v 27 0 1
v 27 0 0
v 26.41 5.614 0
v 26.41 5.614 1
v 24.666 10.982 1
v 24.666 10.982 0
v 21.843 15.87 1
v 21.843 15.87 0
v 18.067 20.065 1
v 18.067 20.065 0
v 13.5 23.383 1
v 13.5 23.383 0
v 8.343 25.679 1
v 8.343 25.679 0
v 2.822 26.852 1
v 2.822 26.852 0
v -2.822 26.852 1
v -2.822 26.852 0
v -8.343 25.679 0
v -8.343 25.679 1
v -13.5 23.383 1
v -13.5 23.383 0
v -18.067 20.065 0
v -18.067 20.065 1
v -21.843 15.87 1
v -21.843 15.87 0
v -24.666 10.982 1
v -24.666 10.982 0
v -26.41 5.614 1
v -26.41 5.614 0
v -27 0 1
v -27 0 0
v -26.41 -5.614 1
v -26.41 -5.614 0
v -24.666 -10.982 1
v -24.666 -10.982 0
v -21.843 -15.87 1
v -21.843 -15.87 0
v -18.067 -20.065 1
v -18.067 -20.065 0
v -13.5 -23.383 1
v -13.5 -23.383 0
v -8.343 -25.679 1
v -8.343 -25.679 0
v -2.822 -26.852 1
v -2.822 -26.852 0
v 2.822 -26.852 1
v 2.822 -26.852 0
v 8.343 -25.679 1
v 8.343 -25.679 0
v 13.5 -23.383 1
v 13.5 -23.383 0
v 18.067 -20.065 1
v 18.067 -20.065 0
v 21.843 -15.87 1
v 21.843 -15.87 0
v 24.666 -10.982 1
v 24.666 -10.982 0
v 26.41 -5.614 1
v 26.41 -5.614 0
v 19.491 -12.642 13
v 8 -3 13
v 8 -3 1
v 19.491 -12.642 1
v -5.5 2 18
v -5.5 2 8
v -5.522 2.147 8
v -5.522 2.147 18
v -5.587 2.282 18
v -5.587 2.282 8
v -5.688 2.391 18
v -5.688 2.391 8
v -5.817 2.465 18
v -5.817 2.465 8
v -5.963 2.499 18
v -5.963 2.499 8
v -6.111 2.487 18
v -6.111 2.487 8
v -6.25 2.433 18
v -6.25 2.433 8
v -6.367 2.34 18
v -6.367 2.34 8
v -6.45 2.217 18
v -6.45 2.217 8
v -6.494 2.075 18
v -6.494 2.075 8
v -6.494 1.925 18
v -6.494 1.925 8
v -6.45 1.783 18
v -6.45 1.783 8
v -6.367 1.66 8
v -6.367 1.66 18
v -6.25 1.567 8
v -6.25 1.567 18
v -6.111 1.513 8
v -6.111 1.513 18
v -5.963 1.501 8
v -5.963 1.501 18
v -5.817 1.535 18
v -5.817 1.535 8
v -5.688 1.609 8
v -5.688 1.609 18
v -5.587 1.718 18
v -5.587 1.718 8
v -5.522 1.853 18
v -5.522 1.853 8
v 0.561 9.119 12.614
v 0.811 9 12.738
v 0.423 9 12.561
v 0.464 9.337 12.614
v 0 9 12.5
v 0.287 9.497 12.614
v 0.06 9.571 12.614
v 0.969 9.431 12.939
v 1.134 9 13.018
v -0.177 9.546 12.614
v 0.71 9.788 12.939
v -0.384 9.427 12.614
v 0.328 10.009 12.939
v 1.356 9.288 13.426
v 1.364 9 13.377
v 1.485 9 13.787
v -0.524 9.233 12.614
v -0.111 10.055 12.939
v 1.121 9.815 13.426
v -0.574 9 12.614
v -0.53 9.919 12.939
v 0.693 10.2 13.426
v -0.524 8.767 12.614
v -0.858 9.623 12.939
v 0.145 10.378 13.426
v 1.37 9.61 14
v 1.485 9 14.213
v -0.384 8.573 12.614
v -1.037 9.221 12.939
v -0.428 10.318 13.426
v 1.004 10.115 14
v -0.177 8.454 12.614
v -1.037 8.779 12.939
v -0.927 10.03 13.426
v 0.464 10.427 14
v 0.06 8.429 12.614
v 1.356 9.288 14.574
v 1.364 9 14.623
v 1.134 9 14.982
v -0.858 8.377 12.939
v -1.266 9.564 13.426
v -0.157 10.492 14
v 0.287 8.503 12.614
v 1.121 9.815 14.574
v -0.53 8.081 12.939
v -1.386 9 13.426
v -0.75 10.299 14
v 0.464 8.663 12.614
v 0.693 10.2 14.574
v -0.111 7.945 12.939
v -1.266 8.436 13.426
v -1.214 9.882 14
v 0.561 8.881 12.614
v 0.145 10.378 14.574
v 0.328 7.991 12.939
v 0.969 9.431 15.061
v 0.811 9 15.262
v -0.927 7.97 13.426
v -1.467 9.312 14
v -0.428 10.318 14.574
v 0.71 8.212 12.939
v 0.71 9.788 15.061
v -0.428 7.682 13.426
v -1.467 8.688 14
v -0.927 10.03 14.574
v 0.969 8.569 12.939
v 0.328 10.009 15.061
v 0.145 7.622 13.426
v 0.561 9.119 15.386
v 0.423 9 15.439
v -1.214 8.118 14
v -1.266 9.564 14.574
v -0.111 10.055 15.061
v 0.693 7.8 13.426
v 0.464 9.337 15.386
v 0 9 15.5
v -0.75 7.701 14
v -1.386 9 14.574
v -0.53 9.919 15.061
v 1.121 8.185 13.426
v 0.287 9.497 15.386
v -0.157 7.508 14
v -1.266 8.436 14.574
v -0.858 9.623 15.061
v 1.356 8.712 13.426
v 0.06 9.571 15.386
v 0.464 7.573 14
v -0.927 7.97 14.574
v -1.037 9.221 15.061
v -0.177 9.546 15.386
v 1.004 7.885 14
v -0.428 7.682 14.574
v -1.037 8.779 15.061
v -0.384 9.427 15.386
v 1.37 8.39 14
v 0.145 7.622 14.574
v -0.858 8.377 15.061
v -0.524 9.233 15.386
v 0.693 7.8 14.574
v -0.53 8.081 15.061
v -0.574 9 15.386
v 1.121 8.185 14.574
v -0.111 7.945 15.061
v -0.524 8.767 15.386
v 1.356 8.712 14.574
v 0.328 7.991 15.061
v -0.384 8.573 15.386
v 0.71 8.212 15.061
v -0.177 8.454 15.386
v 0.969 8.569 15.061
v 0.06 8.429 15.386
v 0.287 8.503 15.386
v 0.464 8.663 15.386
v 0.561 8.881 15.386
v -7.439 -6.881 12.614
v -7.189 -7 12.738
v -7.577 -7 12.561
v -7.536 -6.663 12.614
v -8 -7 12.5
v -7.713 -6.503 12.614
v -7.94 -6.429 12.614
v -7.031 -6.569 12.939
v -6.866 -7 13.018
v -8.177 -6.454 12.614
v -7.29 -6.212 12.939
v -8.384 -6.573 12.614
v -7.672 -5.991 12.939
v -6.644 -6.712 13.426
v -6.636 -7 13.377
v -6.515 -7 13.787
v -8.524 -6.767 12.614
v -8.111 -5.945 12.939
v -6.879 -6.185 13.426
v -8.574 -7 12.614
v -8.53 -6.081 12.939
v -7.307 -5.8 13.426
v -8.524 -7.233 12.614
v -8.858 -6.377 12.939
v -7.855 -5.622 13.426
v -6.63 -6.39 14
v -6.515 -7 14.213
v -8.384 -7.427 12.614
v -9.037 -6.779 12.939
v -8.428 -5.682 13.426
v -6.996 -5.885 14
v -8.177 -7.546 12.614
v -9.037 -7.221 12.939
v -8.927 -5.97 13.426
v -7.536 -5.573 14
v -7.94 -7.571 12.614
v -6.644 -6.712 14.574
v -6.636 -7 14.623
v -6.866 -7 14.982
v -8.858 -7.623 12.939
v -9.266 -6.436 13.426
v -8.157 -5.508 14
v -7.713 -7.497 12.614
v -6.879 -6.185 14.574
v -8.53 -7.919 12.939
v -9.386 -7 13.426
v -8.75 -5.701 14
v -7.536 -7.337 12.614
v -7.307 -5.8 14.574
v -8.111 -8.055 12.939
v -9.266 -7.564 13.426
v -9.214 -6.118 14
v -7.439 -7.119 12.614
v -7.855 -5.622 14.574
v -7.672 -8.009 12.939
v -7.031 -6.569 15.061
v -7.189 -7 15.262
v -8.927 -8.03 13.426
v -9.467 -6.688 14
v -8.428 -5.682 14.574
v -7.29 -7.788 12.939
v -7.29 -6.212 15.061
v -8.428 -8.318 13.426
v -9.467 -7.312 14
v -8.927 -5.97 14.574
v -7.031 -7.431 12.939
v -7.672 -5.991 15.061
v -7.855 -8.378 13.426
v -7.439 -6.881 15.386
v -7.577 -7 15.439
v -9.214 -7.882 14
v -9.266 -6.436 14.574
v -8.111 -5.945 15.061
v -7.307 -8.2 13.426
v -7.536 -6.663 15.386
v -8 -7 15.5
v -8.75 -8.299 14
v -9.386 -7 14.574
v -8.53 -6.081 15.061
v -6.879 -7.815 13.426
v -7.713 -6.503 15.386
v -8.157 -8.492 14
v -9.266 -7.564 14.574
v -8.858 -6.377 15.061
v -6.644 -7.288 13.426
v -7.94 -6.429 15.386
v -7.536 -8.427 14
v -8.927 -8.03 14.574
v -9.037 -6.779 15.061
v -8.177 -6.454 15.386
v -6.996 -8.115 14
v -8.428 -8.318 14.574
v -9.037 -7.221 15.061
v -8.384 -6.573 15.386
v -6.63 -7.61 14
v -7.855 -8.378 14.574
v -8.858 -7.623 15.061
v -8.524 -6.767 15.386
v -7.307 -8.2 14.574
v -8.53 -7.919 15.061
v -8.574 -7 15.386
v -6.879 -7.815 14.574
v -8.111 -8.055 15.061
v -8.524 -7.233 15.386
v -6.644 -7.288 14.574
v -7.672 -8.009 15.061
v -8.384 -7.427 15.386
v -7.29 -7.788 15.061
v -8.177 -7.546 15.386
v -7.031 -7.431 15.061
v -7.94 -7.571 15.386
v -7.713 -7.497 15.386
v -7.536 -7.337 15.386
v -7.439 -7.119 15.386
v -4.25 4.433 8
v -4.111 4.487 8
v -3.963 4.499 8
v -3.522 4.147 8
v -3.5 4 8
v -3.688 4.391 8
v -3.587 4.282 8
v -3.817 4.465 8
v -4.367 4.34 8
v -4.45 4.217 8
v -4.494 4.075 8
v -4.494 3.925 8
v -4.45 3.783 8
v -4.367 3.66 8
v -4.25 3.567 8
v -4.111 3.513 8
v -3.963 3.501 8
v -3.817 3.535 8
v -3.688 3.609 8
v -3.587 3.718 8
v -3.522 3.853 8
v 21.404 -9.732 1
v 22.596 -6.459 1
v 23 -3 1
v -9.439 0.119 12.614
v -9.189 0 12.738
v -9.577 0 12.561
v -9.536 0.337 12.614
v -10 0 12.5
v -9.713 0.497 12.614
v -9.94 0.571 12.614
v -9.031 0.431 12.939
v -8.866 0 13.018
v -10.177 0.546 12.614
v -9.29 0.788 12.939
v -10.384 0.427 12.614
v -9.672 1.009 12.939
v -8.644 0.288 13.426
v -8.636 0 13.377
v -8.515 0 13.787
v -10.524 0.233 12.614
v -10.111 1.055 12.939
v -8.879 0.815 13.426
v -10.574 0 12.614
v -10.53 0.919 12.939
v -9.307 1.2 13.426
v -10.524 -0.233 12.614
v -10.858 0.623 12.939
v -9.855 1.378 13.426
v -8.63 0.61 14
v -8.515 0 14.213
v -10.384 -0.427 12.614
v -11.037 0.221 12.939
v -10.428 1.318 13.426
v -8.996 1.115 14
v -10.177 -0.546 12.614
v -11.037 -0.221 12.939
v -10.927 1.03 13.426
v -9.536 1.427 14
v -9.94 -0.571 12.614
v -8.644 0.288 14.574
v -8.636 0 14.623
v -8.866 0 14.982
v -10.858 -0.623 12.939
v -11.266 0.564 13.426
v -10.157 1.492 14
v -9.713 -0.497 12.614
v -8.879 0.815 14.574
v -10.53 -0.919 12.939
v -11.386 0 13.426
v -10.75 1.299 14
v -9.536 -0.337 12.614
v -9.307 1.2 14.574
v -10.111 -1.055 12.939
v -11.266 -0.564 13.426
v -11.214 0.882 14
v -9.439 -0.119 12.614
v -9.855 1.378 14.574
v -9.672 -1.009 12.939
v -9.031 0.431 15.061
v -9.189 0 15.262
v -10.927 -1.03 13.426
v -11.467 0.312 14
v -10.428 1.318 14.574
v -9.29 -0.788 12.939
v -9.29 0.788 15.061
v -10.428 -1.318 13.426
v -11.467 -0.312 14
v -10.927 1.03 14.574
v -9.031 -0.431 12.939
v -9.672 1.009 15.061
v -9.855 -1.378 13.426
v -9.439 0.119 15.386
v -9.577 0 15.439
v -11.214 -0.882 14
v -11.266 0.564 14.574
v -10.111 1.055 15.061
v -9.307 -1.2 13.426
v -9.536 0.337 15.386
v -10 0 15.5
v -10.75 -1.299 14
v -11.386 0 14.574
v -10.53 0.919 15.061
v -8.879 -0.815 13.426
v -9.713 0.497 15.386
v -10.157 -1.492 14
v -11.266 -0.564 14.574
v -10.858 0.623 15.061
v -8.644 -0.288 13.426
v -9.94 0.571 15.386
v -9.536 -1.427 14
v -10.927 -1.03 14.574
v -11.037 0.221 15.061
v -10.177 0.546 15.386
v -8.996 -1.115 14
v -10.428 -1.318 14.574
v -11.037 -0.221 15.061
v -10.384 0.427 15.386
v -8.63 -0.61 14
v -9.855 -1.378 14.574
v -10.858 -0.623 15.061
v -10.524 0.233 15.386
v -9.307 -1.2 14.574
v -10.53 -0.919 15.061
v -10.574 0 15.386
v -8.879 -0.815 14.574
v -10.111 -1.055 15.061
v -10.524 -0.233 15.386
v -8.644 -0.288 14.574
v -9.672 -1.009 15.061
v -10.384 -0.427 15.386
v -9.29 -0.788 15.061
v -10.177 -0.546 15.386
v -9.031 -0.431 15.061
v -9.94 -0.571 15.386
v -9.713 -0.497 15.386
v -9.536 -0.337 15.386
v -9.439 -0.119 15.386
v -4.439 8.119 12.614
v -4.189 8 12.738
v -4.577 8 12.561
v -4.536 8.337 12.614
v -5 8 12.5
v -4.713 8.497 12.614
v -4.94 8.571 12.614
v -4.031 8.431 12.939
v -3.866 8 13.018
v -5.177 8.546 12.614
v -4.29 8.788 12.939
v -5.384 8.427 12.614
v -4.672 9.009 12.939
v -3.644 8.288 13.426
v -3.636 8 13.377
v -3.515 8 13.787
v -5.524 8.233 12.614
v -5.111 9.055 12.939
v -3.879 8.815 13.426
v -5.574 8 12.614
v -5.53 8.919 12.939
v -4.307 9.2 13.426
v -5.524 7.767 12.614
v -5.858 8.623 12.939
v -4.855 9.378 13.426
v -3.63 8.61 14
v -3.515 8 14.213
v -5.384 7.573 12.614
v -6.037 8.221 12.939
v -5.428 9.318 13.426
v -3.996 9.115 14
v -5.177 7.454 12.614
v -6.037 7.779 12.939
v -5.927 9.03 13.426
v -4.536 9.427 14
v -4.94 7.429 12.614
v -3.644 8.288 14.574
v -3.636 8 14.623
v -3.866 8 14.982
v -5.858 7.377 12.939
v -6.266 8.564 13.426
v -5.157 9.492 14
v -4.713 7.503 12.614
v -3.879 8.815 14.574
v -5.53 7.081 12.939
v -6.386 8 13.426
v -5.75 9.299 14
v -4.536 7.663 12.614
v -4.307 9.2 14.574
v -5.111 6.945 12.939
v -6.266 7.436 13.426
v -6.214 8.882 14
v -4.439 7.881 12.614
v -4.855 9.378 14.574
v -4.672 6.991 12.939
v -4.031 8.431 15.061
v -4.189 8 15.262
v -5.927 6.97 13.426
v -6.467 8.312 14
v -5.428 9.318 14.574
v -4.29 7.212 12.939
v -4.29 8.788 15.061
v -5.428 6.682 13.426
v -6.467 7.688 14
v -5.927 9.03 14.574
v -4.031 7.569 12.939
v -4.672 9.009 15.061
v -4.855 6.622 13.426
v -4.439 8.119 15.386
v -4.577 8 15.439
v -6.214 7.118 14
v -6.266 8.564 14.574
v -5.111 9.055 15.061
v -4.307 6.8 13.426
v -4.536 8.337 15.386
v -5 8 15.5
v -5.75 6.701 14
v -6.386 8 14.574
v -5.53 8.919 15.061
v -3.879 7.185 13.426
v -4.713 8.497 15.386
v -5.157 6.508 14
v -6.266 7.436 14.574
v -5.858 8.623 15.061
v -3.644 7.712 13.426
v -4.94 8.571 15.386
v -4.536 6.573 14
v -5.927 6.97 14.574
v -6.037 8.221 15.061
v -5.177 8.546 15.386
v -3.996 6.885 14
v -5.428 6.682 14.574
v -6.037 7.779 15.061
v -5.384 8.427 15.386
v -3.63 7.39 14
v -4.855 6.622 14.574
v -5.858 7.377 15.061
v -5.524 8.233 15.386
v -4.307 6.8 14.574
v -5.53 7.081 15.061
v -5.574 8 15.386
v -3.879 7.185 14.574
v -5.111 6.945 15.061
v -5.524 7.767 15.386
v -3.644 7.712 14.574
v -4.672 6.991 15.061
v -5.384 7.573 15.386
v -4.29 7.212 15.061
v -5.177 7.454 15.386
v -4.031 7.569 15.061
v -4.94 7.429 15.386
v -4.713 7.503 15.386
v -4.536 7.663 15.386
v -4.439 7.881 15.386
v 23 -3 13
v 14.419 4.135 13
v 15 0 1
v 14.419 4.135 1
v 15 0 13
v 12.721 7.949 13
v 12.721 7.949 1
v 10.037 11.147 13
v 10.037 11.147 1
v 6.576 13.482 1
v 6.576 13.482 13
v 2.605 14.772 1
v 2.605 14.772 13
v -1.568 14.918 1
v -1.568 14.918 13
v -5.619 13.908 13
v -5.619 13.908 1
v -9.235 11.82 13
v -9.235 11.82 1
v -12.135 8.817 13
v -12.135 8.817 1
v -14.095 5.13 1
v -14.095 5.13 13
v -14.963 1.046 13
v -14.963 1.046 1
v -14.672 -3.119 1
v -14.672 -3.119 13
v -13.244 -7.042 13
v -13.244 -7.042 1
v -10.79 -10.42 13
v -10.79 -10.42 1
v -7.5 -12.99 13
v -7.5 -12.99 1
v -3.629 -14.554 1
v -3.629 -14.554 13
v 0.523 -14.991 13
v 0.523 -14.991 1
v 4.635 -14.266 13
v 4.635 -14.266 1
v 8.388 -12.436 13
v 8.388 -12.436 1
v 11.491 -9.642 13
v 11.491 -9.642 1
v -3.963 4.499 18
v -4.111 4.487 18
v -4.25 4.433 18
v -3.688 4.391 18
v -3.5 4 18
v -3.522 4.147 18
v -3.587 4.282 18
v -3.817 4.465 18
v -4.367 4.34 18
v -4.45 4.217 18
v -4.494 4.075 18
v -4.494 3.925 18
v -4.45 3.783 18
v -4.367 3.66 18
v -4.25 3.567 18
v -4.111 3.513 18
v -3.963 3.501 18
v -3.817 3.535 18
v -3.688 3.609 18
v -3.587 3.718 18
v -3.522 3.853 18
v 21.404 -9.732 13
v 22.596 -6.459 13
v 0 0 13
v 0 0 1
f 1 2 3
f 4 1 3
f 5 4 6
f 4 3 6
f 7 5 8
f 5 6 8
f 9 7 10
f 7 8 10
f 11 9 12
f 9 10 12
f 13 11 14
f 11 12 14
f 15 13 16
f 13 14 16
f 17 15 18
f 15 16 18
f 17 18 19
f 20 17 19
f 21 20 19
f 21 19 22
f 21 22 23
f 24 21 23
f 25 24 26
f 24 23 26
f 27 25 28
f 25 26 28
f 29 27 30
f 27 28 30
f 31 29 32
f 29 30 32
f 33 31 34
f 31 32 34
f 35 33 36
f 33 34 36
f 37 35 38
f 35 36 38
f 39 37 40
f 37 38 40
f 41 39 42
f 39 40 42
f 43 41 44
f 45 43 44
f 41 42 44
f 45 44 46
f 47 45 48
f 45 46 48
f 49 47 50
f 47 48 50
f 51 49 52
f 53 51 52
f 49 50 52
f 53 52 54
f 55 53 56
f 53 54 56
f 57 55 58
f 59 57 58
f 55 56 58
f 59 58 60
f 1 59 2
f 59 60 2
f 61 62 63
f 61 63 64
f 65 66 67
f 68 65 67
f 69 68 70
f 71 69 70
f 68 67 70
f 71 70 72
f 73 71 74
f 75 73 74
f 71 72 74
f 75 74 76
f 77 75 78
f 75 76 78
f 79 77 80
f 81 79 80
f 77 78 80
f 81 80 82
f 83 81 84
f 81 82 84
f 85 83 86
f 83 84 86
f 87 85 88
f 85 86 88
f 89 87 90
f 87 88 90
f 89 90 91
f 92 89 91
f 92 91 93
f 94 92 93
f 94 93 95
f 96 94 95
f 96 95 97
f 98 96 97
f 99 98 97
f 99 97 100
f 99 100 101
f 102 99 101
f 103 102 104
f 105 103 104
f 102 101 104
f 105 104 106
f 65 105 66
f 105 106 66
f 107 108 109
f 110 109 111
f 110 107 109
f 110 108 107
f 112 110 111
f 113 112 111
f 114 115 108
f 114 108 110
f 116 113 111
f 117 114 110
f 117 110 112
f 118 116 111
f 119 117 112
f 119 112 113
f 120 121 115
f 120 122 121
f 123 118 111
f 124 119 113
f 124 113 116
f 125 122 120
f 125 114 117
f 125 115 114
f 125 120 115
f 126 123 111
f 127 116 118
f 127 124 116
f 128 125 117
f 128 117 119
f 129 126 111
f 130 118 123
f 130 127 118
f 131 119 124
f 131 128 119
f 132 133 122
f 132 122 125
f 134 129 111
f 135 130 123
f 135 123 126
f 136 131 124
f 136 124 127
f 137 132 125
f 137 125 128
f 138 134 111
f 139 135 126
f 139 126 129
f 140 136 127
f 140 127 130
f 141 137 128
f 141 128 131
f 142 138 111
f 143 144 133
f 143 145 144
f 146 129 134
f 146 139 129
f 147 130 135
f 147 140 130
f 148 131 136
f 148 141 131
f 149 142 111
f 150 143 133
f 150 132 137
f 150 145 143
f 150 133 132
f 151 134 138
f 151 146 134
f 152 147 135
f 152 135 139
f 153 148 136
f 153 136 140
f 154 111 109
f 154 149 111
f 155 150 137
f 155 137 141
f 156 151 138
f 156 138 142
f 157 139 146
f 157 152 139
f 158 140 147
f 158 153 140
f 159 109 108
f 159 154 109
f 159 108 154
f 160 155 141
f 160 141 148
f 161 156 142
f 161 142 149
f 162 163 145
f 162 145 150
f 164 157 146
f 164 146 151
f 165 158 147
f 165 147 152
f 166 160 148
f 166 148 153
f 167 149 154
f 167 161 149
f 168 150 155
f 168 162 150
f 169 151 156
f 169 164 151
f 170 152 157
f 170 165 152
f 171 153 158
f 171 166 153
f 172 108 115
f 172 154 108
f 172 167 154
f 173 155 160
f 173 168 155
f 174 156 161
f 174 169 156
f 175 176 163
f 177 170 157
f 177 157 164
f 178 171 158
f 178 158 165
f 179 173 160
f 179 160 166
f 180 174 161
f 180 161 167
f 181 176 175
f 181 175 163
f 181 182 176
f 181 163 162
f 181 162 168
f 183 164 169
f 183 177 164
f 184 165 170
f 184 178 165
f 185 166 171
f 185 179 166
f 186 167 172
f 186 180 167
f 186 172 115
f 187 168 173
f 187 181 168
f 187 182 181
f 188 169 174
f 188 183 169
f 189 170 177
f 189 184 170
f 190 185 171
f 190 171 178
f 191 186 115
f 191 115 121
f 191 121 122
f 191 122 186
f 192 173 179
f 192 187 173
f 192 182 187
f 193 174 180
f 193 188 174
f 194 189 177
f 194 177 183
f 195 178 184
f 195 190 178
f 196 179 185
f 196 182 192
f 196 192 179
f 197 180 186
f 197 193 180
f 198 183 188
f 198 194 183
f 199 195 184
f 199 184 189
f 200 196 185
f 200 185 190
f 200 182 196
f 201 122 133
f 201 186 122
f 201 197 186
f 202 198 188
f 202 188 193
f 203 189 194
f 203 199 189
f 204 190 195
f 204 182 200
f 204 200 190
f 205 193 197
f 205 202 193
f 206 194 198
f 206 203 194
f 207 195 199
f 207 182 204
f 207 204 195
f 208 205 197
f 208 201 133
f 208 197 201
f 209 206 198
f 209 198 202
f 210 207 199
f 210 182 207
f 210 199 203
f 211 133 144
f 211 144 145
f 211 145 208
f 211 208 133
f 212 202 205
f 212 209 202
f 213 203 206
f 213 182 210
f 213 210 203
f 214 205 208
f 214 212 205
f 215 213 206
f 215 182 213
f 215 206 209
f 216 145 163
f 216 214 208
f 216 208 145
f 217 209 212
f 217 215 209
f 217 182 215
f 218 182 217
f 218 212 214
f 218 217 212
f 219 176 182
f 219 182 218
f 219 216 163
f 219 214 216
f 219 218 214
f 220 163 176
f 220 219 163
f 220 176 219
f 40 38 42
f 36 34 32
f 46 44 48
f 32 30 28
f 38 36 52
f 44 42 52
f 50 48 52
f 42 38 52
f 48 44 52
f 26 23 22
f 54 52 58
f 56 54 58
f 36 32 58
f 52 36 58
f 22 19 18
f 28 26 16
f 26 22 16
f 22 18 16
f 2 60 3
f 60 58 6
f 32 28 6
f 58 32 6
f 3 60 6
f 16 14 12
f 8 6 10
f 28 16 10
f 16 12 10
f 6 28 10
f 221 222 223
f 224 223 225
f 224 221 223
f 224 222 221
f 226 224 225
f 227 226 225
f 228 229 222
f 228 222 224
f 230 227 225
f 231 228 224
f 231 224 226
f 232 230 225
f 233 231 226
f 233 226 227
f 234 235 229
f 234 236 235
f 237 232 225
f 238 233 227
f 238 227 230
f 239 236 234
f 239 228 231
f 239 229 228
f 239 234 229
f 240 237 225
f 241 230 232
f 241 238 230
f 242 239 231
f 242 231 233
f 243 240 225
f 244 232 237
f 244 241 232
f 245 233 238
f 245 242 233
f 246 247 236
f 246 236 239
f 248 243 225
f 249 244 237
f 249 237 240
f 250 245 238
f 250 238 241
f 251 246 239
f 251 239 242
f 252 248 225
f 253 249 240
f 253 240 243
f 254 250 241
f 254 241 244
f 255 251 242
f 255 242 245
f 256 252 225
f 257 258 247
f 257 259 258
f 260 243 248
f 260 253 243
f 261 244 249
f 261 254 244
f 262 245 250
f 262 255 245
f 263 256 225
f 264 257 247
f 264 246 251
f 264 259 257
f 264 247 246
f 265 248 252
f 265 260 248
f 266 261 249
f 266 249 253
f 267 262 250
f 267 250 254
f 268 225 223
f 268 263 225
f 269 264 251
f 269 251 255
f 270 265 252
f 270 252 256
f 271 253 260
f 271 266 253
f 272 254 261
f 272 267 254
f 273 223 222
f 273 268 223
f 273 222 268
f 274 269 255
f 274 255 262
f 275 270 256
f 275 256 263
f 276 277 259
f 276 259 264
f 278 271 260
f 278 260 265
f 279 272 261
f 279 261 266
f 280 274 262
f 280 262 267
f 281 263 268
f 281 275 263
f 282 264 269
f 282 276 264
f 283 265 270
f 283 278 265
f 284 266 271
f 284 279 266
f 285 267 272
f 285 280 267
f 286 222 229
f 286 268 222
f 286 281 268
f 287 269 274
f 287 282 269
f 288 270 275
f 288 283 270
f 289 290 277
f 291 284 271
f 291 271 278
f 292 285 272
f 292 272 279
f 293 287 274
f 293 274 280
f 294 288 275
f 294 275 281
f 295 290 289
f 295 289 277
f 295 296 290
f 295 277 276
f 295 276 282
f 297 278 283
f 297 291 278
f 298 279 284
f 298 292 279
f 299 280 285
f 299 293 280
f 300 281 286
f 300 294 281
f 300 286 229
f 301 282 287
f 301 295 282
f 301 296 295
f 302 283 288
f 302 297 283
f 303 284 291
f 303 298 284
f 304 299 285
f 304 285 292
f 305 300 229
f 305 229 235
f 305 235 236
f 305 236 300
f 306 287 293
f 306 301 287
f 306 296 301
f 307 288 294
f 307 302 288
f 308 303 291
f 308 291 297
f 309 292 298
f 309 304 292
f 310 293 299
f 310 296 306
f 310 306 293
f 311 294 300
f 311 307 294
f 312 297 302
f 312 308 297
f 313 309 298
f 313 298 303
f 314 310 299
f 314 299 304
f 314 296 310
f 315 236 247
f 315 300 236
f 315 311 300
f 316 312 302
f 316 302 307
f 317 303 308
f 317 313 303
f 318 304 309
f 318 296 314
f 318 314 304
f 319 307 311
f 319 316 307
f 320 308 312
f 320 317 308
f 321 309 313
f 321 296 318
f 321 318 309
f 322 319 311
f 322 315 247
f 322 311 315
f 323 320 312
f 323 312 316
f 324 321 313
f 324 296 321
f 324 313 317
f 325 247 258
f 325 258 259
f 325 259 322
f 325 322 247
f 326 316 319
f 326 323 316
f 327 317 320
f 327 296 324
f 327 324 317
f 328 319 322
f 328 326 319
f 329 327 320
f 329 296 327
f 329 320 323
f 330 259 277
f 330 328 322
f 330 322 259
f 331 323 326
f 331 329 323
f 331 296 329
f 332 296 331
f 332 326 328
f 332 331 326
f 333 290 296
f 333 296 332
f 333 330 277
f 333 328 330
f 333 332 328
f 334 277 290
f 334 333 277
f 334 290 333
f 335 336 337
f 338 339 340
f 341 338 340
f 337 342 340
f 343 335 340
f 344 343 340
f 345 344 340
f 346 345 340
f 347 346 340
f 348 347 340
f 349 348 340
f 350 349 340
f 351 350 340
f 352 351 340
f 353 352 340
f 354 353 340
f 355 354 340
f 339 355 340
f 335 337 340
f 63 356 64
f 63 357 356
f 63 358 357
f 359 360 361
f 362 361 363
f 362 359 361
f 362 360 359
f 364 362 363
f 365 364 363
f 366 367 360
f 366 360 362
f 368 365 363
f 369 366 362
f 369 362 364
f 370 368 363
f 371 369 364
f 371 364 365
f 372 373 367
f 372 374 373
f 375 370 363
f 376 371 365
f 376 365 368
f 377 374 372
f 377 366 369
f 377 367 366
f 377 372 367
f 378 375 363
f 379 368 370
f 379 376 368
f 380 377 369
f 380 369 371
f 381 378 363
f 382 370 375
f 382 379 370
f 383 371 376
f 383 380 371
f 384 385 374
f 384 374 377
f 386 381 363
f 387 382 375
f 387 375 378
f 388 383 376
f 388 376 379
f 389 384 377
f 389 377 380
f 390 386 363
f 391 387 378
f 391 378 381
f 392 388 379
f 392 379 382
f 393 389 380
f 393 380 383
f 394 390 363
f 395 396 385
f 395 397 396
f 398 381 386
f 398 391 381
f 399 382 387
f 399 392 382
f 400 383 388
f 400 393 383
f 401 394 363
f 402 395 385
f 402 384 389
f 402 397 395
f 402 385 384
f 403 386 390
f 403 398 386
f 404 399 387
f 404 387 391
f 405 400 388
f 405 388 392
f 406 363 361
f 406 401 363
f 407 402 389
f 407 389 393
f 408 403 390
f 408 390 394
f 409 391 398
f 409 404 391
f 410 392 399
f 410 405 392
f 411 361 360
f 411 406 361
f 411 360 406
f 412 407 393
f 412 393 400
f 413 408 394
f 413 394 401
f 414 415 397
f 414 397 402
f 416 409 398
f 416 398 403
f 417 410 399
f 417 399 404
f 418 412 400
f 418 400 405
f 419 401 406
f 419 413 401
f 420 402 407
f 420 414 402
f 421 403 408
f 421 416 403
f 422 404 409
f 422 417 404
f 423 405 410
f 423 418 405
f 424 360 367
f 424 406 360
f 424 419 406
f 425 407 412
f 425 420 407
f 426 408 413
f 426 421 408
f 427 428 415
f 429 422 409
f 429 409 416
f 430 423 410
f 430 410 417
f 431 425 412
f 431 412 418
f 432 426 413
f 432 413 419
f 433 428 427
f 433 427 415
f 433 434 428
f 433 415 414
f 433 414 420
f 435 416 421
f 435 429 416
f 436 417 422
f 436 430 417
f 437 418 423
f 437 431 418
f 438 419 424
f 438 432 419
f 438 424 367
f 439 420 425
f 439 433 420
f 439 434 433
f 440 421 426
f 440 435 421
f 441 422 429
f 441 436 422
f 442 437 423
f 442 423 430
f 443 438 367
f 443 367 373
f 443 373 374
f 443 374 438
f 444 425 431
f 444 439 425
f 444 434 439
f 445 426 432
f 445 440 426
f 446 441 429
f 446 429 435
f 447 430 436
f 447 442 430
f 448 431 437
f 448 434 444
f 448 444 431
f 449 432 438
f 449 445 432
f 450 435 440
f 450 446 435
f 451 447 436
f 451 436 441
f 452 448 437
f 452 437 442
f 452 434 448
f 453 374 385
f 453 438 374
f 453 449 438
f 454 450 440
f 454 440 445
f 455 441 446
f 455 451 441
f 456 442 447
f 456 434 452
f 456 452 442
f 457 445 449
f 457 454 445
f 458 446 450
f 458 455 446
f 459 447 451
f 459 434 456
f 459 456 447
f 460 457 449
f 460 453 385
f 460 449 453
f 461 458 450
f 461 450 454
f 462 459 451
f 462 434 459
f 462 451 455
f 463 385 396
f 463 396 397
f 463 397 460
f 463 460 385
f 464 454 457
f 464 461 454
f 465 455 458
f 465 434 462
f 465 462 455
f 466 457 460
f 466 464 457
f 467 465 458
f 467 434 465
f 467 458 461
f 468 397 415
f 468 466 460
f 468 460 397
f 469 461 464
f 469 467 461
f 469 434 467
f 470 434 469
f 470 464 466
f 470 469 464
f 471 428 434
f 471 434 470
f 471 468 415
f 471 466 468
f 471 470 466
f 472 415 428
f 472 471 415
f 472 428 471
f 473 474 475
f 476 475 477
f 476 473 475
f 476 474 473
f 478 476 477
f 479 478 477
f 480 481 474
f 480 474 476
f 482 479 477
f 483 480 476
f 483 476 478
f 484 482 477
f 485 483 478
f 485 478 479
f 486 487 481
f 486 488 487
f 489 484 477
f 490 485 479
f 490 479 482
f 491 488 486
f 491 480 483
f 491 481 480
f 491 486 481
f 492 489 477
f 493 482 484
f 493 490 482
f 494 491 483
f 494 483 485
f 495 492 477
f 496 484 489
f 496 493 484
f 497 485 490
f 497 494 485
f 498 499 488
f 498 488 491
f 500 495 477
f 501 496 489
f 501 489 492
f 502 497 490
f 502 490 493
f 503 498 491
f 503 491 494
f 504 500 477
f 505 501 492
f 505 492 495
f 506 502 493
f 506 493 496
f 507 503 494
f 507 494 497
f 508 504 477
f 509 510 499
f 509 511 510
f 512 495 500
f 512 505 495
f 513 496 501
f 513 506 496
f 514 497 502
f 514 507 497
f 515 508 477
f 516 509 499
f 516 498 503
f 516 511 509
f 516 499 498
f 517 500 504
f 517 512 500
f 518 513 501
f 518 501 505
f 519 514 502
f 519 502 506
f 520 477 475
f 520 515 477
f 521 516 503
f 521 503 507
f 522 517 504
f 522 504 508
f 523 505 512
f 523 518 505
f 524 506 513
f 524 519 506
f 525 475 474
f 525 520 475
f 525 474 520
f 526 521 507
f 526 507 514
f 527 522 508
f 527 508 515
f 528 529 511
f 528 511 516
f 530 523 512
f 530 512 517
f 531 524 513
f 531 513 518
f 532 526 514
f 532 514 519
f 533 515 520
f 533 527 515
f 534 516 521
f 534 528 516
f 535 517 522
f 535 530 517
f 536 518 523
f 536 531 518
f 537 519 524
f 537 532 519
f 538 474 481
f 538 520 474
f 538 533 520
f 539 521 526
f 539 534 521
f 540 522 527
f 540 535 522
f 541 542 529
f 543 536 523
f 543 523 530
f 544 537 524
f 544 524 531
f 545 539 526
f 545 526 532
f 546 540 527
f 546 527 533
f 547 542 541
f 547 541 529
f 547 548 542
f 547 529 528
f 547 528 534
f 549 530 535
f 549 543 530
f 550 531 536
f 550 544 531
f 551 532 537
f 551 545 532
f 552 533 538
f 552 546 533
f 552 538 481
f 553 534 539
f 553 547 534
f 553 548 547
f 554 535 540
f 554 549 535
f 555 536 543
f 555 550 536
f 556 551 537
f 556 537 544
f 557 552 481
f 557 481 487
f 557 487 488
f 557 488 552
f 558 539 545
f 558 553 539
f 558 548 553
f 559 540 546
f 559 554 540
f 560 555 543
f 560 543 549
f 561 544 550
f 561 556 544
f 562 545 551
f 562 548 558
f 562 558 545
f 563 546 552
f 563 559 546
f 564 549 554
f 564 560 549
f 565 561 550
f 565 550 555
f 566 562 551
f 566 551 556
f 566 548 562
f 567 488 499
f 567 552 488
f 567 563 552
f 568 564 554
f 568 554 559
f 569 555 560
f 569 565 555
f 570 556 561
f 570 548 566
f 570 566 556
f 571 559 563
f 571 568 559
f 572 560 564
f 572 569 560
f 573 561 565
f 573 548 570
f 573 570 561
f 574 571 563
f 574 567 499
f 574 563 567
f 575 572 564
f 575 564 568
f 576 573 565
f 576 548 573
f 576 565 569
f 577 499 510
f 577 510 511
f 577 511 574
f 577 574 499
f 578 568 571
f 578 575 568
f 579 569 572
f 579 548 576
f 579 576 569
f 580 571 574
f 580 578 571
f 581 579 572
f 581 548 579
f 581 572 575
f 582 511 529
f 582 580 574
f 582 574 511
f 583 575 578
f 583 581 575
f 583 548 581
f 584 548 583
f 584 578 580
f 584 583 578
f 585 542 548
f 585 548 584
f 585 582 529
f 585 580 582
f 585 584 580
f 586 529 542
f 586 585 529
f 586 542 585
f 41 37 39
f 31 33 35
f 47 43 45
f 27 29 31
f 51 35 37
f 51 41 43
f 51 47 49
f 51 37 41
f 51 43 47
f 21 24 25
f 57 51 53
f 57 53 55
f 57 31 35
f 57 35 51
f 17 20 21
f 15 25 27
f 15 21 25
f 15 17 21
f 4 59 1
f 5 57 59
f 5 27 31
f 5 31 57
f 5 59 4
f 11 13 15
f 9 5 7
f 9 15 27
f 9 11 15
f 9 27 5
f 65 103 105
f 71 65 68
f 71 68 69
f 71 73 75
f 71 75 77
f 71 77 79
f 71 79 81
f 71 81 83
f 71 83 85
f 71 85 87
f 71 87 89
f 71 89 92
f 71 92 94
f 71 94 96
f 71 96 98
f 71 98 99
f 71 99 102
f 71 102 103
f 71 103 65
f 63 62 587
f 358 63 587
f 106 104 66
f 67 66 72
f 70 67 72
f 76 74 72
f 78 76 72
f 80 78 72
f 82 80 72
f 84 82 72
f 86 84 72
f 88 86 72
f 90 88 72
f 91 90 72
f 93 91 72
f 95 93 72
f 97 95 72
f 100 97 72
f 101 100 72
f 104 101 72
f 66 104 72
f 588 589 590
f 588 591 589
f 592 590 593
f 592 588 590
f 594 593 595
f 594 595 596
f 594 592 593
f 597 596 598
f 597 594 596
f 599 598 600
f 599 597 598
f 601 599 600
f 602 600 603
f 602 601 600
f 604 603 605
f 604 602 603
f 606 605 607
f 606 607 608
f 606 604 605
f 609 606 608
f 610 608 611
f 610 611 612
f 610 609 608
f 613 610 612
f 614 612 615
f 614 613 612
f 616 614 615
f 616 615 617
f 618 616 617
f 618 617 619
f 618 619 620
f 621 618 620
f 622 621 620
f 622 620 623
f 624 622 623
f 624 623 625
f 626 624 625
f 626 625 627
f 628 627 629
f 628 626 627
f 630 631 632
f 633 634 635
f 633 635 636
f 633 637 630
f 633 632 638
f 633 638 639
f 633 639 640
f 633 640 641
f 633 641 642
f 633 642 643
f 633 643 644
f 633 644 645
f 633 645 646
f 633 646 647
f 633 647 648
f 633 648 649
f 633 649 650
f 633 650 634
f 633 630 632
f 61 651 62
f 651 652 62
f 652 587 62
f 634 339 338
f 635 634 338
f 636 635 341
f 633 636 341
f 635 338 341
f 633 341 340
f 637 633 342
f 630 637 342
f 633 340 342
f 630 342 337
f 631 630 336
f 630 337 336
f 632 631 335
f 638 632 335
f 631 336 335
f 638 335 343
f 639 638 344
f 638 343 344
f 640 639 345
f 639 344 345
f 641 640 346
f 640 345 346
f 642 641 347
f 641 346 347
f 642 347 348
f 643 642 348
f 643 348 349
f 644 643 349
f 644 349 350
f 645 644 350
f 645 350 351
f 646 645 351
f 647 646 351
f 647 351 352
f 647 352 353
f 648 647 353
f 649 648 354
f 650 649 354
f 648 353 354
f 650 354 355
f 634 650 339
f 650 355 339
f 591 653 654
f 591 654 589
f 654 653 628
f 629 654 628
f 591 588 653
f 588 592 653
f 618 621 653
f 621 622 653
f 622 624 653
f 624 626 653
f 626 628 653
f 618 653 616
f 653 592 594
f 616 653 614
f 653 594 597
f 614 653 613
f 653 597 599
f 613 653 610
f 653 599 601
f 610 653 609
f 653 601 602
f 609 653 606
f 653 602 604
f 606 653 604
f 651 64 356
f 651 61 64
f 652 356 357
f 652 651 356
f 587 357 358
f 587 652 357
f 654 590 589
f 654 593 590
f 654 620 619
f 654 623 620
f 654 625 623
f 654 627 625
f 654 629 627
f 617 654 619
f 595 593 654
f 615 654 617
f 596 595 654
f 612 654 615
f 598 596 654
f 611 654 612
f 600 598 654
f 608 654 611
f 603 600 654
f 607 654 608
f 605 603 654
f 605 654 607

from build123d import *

# Parameters (mm, degrees)
CYLINDER_W                  = 15
CYLINDER_H                  = 12
CYLINDER_ANGLE              = 320
CYLINDER001_W               = 15
CYLINDER001_H               = 12
CYLINDER001_ANGLE           = 40
CYLINDER001_PLACEMENT_ANGLE = 320
CYLINDER002_R               = 27
CYLINDER002_DEPTH           = 1
CYLINDER003_R               = 0.5
CYLINDER003_DEPTH           = 10
CYLINDER004_R               = 0.5
CYLINDER004_DEPTH           = 10


with BuildPart() as tarta:
    # Cylinder → Cylinder (revolve)
    with BuildSketch(Plane(origin=(0, 0, 1), x_dir=(1, 0, 0), z_dir=(0, -1, 0))):
        with Locations((7.5, 6)):
            Rectangle(CYLINDER_W, CYLINDER_H)
    revolve(axis=Axis((0, 0, 1), (0, 0, 1)), revolution_arc=CYLINDER_ANGLE)


with BuildPart() as porcion:
    # Cylinder001 → Cylinder001 (revolve)
    with BuildSketch(Plane.XZ):
        with Locations((7.5, 6)):
            Rectangle(CYLINDER001_W, CYLINDER001_H)
    revolve(axis=Axis((0, 0, 0), (0, 0, 1)), revolution_arc=CYLINDER001_ANGLE)


with BuildPart() as porcion_1:
    # Cylinder001 placement: moved
    add(porcion.part.moved(Location((8, -3, 1))).rotate(Axis((8, -3, 1), (0, 0, 1)), CYLINDER001_PLACEMENT_ANGLE))


with BuildPart() as plato:
    # Cylinder002 → Cylinder002 (new body)
    with BuildSketch(Plane.XY):
        Circle(CYLINDER002_R)
    extrude(amount=CYLINDER002_DEPTH)


with BuildPart() as guinda1:
    # Sphere → Sphere (revolve)
    with BuildSketch(Plane(origin=(-10, 0, 14), x_dir=(1, 0, 0), z_dir=(0, -1, 0))):
        with BuildLine():
            ThreePointArc((0, -1.5), (1.5, 0), (0, 1.5))
            Line((0, 1.5), (0, -1.5))
        make_face()
    revolve(axis=Axis((-10, 0, 14), (0, 0, 1)))


with BuildPart() as sphere001:
    # Sphere001 → Sphere001 (revolve)
    with BuildSketch(Plane(origin=(0, 9, 14), x_dir=(1, 0, 0), z_dir=(0, -1, 0))):
        with BuildLine():
            ThreePointArc((0, -1.5), (1.5, 0), (0, 1.5))
            Line((0, 1.5), (0, -1.5))
        make_face()
    revolve(axis=Axis((0, 9, 14), (0, 0, 1)))


with BuildPart() as sphere002:
    # Sphere002 → Sphere002 (revolve)
    with BuildSketch(Plane(origin=(-5, 8, 14), x_dir=(1, 0, 0), z_dir=(0, -1, 0))):
        with BuildLine():
            ThreePointArc((0, -1.5), (1.5, 0), (0, 1.5))
            Line((0, 1.5), (0, -1.5))
        make_face()
    revolve(axis=Axis((-5, 8, 14), (0, 0, 1)))


with BuildPart() as sphere003:
    # Sphere003 → Sphere003 (revolve)
    with BuildSketch(Plane(origin=(-8, -7, 14), x_dir=(1, 0, 0), z_dir=(0, -1, 0))):
        with BuildLine():
            ThreePointArc((0, -1.5), (1.5, 0), (0, 1.5))
            Line((0, 1.5), (0, -1.5))
        make_face()
    revolve(axis=Axis((-8, -7, 14), (0, 0, 1)))


with BuildPart() as cylinder003:
    # Cylinder003 → Cylinder003 (new body)
    with BuildSketch(Plane(origin=(-4, 4, 8), x_dir=(1, 0, 0), z_dir=(0, 0, 1))):
        Circle(CYLINDER003_R)
    extrude(amount=CYLINDER003_DEPTH)


with BuildPart() as cylinder004:
    # Cylinder004 → Cylinder004 (new body)
    with BuildSketch(Plane(origin=(-6, 2, 8), x_dir=(1, 0, 0), z_dir=(0, 0, 1))):
        Circle(CYLINDER004_R)
    extrude(amount=CYLINDER004_DEPTH)


solid = Compound([tarta.part, porcion_1.part, plato.part, guinda1.part, sphere001.part, sphere002.part, sphere003.part, cylinder003.part, cylinder004.part])
